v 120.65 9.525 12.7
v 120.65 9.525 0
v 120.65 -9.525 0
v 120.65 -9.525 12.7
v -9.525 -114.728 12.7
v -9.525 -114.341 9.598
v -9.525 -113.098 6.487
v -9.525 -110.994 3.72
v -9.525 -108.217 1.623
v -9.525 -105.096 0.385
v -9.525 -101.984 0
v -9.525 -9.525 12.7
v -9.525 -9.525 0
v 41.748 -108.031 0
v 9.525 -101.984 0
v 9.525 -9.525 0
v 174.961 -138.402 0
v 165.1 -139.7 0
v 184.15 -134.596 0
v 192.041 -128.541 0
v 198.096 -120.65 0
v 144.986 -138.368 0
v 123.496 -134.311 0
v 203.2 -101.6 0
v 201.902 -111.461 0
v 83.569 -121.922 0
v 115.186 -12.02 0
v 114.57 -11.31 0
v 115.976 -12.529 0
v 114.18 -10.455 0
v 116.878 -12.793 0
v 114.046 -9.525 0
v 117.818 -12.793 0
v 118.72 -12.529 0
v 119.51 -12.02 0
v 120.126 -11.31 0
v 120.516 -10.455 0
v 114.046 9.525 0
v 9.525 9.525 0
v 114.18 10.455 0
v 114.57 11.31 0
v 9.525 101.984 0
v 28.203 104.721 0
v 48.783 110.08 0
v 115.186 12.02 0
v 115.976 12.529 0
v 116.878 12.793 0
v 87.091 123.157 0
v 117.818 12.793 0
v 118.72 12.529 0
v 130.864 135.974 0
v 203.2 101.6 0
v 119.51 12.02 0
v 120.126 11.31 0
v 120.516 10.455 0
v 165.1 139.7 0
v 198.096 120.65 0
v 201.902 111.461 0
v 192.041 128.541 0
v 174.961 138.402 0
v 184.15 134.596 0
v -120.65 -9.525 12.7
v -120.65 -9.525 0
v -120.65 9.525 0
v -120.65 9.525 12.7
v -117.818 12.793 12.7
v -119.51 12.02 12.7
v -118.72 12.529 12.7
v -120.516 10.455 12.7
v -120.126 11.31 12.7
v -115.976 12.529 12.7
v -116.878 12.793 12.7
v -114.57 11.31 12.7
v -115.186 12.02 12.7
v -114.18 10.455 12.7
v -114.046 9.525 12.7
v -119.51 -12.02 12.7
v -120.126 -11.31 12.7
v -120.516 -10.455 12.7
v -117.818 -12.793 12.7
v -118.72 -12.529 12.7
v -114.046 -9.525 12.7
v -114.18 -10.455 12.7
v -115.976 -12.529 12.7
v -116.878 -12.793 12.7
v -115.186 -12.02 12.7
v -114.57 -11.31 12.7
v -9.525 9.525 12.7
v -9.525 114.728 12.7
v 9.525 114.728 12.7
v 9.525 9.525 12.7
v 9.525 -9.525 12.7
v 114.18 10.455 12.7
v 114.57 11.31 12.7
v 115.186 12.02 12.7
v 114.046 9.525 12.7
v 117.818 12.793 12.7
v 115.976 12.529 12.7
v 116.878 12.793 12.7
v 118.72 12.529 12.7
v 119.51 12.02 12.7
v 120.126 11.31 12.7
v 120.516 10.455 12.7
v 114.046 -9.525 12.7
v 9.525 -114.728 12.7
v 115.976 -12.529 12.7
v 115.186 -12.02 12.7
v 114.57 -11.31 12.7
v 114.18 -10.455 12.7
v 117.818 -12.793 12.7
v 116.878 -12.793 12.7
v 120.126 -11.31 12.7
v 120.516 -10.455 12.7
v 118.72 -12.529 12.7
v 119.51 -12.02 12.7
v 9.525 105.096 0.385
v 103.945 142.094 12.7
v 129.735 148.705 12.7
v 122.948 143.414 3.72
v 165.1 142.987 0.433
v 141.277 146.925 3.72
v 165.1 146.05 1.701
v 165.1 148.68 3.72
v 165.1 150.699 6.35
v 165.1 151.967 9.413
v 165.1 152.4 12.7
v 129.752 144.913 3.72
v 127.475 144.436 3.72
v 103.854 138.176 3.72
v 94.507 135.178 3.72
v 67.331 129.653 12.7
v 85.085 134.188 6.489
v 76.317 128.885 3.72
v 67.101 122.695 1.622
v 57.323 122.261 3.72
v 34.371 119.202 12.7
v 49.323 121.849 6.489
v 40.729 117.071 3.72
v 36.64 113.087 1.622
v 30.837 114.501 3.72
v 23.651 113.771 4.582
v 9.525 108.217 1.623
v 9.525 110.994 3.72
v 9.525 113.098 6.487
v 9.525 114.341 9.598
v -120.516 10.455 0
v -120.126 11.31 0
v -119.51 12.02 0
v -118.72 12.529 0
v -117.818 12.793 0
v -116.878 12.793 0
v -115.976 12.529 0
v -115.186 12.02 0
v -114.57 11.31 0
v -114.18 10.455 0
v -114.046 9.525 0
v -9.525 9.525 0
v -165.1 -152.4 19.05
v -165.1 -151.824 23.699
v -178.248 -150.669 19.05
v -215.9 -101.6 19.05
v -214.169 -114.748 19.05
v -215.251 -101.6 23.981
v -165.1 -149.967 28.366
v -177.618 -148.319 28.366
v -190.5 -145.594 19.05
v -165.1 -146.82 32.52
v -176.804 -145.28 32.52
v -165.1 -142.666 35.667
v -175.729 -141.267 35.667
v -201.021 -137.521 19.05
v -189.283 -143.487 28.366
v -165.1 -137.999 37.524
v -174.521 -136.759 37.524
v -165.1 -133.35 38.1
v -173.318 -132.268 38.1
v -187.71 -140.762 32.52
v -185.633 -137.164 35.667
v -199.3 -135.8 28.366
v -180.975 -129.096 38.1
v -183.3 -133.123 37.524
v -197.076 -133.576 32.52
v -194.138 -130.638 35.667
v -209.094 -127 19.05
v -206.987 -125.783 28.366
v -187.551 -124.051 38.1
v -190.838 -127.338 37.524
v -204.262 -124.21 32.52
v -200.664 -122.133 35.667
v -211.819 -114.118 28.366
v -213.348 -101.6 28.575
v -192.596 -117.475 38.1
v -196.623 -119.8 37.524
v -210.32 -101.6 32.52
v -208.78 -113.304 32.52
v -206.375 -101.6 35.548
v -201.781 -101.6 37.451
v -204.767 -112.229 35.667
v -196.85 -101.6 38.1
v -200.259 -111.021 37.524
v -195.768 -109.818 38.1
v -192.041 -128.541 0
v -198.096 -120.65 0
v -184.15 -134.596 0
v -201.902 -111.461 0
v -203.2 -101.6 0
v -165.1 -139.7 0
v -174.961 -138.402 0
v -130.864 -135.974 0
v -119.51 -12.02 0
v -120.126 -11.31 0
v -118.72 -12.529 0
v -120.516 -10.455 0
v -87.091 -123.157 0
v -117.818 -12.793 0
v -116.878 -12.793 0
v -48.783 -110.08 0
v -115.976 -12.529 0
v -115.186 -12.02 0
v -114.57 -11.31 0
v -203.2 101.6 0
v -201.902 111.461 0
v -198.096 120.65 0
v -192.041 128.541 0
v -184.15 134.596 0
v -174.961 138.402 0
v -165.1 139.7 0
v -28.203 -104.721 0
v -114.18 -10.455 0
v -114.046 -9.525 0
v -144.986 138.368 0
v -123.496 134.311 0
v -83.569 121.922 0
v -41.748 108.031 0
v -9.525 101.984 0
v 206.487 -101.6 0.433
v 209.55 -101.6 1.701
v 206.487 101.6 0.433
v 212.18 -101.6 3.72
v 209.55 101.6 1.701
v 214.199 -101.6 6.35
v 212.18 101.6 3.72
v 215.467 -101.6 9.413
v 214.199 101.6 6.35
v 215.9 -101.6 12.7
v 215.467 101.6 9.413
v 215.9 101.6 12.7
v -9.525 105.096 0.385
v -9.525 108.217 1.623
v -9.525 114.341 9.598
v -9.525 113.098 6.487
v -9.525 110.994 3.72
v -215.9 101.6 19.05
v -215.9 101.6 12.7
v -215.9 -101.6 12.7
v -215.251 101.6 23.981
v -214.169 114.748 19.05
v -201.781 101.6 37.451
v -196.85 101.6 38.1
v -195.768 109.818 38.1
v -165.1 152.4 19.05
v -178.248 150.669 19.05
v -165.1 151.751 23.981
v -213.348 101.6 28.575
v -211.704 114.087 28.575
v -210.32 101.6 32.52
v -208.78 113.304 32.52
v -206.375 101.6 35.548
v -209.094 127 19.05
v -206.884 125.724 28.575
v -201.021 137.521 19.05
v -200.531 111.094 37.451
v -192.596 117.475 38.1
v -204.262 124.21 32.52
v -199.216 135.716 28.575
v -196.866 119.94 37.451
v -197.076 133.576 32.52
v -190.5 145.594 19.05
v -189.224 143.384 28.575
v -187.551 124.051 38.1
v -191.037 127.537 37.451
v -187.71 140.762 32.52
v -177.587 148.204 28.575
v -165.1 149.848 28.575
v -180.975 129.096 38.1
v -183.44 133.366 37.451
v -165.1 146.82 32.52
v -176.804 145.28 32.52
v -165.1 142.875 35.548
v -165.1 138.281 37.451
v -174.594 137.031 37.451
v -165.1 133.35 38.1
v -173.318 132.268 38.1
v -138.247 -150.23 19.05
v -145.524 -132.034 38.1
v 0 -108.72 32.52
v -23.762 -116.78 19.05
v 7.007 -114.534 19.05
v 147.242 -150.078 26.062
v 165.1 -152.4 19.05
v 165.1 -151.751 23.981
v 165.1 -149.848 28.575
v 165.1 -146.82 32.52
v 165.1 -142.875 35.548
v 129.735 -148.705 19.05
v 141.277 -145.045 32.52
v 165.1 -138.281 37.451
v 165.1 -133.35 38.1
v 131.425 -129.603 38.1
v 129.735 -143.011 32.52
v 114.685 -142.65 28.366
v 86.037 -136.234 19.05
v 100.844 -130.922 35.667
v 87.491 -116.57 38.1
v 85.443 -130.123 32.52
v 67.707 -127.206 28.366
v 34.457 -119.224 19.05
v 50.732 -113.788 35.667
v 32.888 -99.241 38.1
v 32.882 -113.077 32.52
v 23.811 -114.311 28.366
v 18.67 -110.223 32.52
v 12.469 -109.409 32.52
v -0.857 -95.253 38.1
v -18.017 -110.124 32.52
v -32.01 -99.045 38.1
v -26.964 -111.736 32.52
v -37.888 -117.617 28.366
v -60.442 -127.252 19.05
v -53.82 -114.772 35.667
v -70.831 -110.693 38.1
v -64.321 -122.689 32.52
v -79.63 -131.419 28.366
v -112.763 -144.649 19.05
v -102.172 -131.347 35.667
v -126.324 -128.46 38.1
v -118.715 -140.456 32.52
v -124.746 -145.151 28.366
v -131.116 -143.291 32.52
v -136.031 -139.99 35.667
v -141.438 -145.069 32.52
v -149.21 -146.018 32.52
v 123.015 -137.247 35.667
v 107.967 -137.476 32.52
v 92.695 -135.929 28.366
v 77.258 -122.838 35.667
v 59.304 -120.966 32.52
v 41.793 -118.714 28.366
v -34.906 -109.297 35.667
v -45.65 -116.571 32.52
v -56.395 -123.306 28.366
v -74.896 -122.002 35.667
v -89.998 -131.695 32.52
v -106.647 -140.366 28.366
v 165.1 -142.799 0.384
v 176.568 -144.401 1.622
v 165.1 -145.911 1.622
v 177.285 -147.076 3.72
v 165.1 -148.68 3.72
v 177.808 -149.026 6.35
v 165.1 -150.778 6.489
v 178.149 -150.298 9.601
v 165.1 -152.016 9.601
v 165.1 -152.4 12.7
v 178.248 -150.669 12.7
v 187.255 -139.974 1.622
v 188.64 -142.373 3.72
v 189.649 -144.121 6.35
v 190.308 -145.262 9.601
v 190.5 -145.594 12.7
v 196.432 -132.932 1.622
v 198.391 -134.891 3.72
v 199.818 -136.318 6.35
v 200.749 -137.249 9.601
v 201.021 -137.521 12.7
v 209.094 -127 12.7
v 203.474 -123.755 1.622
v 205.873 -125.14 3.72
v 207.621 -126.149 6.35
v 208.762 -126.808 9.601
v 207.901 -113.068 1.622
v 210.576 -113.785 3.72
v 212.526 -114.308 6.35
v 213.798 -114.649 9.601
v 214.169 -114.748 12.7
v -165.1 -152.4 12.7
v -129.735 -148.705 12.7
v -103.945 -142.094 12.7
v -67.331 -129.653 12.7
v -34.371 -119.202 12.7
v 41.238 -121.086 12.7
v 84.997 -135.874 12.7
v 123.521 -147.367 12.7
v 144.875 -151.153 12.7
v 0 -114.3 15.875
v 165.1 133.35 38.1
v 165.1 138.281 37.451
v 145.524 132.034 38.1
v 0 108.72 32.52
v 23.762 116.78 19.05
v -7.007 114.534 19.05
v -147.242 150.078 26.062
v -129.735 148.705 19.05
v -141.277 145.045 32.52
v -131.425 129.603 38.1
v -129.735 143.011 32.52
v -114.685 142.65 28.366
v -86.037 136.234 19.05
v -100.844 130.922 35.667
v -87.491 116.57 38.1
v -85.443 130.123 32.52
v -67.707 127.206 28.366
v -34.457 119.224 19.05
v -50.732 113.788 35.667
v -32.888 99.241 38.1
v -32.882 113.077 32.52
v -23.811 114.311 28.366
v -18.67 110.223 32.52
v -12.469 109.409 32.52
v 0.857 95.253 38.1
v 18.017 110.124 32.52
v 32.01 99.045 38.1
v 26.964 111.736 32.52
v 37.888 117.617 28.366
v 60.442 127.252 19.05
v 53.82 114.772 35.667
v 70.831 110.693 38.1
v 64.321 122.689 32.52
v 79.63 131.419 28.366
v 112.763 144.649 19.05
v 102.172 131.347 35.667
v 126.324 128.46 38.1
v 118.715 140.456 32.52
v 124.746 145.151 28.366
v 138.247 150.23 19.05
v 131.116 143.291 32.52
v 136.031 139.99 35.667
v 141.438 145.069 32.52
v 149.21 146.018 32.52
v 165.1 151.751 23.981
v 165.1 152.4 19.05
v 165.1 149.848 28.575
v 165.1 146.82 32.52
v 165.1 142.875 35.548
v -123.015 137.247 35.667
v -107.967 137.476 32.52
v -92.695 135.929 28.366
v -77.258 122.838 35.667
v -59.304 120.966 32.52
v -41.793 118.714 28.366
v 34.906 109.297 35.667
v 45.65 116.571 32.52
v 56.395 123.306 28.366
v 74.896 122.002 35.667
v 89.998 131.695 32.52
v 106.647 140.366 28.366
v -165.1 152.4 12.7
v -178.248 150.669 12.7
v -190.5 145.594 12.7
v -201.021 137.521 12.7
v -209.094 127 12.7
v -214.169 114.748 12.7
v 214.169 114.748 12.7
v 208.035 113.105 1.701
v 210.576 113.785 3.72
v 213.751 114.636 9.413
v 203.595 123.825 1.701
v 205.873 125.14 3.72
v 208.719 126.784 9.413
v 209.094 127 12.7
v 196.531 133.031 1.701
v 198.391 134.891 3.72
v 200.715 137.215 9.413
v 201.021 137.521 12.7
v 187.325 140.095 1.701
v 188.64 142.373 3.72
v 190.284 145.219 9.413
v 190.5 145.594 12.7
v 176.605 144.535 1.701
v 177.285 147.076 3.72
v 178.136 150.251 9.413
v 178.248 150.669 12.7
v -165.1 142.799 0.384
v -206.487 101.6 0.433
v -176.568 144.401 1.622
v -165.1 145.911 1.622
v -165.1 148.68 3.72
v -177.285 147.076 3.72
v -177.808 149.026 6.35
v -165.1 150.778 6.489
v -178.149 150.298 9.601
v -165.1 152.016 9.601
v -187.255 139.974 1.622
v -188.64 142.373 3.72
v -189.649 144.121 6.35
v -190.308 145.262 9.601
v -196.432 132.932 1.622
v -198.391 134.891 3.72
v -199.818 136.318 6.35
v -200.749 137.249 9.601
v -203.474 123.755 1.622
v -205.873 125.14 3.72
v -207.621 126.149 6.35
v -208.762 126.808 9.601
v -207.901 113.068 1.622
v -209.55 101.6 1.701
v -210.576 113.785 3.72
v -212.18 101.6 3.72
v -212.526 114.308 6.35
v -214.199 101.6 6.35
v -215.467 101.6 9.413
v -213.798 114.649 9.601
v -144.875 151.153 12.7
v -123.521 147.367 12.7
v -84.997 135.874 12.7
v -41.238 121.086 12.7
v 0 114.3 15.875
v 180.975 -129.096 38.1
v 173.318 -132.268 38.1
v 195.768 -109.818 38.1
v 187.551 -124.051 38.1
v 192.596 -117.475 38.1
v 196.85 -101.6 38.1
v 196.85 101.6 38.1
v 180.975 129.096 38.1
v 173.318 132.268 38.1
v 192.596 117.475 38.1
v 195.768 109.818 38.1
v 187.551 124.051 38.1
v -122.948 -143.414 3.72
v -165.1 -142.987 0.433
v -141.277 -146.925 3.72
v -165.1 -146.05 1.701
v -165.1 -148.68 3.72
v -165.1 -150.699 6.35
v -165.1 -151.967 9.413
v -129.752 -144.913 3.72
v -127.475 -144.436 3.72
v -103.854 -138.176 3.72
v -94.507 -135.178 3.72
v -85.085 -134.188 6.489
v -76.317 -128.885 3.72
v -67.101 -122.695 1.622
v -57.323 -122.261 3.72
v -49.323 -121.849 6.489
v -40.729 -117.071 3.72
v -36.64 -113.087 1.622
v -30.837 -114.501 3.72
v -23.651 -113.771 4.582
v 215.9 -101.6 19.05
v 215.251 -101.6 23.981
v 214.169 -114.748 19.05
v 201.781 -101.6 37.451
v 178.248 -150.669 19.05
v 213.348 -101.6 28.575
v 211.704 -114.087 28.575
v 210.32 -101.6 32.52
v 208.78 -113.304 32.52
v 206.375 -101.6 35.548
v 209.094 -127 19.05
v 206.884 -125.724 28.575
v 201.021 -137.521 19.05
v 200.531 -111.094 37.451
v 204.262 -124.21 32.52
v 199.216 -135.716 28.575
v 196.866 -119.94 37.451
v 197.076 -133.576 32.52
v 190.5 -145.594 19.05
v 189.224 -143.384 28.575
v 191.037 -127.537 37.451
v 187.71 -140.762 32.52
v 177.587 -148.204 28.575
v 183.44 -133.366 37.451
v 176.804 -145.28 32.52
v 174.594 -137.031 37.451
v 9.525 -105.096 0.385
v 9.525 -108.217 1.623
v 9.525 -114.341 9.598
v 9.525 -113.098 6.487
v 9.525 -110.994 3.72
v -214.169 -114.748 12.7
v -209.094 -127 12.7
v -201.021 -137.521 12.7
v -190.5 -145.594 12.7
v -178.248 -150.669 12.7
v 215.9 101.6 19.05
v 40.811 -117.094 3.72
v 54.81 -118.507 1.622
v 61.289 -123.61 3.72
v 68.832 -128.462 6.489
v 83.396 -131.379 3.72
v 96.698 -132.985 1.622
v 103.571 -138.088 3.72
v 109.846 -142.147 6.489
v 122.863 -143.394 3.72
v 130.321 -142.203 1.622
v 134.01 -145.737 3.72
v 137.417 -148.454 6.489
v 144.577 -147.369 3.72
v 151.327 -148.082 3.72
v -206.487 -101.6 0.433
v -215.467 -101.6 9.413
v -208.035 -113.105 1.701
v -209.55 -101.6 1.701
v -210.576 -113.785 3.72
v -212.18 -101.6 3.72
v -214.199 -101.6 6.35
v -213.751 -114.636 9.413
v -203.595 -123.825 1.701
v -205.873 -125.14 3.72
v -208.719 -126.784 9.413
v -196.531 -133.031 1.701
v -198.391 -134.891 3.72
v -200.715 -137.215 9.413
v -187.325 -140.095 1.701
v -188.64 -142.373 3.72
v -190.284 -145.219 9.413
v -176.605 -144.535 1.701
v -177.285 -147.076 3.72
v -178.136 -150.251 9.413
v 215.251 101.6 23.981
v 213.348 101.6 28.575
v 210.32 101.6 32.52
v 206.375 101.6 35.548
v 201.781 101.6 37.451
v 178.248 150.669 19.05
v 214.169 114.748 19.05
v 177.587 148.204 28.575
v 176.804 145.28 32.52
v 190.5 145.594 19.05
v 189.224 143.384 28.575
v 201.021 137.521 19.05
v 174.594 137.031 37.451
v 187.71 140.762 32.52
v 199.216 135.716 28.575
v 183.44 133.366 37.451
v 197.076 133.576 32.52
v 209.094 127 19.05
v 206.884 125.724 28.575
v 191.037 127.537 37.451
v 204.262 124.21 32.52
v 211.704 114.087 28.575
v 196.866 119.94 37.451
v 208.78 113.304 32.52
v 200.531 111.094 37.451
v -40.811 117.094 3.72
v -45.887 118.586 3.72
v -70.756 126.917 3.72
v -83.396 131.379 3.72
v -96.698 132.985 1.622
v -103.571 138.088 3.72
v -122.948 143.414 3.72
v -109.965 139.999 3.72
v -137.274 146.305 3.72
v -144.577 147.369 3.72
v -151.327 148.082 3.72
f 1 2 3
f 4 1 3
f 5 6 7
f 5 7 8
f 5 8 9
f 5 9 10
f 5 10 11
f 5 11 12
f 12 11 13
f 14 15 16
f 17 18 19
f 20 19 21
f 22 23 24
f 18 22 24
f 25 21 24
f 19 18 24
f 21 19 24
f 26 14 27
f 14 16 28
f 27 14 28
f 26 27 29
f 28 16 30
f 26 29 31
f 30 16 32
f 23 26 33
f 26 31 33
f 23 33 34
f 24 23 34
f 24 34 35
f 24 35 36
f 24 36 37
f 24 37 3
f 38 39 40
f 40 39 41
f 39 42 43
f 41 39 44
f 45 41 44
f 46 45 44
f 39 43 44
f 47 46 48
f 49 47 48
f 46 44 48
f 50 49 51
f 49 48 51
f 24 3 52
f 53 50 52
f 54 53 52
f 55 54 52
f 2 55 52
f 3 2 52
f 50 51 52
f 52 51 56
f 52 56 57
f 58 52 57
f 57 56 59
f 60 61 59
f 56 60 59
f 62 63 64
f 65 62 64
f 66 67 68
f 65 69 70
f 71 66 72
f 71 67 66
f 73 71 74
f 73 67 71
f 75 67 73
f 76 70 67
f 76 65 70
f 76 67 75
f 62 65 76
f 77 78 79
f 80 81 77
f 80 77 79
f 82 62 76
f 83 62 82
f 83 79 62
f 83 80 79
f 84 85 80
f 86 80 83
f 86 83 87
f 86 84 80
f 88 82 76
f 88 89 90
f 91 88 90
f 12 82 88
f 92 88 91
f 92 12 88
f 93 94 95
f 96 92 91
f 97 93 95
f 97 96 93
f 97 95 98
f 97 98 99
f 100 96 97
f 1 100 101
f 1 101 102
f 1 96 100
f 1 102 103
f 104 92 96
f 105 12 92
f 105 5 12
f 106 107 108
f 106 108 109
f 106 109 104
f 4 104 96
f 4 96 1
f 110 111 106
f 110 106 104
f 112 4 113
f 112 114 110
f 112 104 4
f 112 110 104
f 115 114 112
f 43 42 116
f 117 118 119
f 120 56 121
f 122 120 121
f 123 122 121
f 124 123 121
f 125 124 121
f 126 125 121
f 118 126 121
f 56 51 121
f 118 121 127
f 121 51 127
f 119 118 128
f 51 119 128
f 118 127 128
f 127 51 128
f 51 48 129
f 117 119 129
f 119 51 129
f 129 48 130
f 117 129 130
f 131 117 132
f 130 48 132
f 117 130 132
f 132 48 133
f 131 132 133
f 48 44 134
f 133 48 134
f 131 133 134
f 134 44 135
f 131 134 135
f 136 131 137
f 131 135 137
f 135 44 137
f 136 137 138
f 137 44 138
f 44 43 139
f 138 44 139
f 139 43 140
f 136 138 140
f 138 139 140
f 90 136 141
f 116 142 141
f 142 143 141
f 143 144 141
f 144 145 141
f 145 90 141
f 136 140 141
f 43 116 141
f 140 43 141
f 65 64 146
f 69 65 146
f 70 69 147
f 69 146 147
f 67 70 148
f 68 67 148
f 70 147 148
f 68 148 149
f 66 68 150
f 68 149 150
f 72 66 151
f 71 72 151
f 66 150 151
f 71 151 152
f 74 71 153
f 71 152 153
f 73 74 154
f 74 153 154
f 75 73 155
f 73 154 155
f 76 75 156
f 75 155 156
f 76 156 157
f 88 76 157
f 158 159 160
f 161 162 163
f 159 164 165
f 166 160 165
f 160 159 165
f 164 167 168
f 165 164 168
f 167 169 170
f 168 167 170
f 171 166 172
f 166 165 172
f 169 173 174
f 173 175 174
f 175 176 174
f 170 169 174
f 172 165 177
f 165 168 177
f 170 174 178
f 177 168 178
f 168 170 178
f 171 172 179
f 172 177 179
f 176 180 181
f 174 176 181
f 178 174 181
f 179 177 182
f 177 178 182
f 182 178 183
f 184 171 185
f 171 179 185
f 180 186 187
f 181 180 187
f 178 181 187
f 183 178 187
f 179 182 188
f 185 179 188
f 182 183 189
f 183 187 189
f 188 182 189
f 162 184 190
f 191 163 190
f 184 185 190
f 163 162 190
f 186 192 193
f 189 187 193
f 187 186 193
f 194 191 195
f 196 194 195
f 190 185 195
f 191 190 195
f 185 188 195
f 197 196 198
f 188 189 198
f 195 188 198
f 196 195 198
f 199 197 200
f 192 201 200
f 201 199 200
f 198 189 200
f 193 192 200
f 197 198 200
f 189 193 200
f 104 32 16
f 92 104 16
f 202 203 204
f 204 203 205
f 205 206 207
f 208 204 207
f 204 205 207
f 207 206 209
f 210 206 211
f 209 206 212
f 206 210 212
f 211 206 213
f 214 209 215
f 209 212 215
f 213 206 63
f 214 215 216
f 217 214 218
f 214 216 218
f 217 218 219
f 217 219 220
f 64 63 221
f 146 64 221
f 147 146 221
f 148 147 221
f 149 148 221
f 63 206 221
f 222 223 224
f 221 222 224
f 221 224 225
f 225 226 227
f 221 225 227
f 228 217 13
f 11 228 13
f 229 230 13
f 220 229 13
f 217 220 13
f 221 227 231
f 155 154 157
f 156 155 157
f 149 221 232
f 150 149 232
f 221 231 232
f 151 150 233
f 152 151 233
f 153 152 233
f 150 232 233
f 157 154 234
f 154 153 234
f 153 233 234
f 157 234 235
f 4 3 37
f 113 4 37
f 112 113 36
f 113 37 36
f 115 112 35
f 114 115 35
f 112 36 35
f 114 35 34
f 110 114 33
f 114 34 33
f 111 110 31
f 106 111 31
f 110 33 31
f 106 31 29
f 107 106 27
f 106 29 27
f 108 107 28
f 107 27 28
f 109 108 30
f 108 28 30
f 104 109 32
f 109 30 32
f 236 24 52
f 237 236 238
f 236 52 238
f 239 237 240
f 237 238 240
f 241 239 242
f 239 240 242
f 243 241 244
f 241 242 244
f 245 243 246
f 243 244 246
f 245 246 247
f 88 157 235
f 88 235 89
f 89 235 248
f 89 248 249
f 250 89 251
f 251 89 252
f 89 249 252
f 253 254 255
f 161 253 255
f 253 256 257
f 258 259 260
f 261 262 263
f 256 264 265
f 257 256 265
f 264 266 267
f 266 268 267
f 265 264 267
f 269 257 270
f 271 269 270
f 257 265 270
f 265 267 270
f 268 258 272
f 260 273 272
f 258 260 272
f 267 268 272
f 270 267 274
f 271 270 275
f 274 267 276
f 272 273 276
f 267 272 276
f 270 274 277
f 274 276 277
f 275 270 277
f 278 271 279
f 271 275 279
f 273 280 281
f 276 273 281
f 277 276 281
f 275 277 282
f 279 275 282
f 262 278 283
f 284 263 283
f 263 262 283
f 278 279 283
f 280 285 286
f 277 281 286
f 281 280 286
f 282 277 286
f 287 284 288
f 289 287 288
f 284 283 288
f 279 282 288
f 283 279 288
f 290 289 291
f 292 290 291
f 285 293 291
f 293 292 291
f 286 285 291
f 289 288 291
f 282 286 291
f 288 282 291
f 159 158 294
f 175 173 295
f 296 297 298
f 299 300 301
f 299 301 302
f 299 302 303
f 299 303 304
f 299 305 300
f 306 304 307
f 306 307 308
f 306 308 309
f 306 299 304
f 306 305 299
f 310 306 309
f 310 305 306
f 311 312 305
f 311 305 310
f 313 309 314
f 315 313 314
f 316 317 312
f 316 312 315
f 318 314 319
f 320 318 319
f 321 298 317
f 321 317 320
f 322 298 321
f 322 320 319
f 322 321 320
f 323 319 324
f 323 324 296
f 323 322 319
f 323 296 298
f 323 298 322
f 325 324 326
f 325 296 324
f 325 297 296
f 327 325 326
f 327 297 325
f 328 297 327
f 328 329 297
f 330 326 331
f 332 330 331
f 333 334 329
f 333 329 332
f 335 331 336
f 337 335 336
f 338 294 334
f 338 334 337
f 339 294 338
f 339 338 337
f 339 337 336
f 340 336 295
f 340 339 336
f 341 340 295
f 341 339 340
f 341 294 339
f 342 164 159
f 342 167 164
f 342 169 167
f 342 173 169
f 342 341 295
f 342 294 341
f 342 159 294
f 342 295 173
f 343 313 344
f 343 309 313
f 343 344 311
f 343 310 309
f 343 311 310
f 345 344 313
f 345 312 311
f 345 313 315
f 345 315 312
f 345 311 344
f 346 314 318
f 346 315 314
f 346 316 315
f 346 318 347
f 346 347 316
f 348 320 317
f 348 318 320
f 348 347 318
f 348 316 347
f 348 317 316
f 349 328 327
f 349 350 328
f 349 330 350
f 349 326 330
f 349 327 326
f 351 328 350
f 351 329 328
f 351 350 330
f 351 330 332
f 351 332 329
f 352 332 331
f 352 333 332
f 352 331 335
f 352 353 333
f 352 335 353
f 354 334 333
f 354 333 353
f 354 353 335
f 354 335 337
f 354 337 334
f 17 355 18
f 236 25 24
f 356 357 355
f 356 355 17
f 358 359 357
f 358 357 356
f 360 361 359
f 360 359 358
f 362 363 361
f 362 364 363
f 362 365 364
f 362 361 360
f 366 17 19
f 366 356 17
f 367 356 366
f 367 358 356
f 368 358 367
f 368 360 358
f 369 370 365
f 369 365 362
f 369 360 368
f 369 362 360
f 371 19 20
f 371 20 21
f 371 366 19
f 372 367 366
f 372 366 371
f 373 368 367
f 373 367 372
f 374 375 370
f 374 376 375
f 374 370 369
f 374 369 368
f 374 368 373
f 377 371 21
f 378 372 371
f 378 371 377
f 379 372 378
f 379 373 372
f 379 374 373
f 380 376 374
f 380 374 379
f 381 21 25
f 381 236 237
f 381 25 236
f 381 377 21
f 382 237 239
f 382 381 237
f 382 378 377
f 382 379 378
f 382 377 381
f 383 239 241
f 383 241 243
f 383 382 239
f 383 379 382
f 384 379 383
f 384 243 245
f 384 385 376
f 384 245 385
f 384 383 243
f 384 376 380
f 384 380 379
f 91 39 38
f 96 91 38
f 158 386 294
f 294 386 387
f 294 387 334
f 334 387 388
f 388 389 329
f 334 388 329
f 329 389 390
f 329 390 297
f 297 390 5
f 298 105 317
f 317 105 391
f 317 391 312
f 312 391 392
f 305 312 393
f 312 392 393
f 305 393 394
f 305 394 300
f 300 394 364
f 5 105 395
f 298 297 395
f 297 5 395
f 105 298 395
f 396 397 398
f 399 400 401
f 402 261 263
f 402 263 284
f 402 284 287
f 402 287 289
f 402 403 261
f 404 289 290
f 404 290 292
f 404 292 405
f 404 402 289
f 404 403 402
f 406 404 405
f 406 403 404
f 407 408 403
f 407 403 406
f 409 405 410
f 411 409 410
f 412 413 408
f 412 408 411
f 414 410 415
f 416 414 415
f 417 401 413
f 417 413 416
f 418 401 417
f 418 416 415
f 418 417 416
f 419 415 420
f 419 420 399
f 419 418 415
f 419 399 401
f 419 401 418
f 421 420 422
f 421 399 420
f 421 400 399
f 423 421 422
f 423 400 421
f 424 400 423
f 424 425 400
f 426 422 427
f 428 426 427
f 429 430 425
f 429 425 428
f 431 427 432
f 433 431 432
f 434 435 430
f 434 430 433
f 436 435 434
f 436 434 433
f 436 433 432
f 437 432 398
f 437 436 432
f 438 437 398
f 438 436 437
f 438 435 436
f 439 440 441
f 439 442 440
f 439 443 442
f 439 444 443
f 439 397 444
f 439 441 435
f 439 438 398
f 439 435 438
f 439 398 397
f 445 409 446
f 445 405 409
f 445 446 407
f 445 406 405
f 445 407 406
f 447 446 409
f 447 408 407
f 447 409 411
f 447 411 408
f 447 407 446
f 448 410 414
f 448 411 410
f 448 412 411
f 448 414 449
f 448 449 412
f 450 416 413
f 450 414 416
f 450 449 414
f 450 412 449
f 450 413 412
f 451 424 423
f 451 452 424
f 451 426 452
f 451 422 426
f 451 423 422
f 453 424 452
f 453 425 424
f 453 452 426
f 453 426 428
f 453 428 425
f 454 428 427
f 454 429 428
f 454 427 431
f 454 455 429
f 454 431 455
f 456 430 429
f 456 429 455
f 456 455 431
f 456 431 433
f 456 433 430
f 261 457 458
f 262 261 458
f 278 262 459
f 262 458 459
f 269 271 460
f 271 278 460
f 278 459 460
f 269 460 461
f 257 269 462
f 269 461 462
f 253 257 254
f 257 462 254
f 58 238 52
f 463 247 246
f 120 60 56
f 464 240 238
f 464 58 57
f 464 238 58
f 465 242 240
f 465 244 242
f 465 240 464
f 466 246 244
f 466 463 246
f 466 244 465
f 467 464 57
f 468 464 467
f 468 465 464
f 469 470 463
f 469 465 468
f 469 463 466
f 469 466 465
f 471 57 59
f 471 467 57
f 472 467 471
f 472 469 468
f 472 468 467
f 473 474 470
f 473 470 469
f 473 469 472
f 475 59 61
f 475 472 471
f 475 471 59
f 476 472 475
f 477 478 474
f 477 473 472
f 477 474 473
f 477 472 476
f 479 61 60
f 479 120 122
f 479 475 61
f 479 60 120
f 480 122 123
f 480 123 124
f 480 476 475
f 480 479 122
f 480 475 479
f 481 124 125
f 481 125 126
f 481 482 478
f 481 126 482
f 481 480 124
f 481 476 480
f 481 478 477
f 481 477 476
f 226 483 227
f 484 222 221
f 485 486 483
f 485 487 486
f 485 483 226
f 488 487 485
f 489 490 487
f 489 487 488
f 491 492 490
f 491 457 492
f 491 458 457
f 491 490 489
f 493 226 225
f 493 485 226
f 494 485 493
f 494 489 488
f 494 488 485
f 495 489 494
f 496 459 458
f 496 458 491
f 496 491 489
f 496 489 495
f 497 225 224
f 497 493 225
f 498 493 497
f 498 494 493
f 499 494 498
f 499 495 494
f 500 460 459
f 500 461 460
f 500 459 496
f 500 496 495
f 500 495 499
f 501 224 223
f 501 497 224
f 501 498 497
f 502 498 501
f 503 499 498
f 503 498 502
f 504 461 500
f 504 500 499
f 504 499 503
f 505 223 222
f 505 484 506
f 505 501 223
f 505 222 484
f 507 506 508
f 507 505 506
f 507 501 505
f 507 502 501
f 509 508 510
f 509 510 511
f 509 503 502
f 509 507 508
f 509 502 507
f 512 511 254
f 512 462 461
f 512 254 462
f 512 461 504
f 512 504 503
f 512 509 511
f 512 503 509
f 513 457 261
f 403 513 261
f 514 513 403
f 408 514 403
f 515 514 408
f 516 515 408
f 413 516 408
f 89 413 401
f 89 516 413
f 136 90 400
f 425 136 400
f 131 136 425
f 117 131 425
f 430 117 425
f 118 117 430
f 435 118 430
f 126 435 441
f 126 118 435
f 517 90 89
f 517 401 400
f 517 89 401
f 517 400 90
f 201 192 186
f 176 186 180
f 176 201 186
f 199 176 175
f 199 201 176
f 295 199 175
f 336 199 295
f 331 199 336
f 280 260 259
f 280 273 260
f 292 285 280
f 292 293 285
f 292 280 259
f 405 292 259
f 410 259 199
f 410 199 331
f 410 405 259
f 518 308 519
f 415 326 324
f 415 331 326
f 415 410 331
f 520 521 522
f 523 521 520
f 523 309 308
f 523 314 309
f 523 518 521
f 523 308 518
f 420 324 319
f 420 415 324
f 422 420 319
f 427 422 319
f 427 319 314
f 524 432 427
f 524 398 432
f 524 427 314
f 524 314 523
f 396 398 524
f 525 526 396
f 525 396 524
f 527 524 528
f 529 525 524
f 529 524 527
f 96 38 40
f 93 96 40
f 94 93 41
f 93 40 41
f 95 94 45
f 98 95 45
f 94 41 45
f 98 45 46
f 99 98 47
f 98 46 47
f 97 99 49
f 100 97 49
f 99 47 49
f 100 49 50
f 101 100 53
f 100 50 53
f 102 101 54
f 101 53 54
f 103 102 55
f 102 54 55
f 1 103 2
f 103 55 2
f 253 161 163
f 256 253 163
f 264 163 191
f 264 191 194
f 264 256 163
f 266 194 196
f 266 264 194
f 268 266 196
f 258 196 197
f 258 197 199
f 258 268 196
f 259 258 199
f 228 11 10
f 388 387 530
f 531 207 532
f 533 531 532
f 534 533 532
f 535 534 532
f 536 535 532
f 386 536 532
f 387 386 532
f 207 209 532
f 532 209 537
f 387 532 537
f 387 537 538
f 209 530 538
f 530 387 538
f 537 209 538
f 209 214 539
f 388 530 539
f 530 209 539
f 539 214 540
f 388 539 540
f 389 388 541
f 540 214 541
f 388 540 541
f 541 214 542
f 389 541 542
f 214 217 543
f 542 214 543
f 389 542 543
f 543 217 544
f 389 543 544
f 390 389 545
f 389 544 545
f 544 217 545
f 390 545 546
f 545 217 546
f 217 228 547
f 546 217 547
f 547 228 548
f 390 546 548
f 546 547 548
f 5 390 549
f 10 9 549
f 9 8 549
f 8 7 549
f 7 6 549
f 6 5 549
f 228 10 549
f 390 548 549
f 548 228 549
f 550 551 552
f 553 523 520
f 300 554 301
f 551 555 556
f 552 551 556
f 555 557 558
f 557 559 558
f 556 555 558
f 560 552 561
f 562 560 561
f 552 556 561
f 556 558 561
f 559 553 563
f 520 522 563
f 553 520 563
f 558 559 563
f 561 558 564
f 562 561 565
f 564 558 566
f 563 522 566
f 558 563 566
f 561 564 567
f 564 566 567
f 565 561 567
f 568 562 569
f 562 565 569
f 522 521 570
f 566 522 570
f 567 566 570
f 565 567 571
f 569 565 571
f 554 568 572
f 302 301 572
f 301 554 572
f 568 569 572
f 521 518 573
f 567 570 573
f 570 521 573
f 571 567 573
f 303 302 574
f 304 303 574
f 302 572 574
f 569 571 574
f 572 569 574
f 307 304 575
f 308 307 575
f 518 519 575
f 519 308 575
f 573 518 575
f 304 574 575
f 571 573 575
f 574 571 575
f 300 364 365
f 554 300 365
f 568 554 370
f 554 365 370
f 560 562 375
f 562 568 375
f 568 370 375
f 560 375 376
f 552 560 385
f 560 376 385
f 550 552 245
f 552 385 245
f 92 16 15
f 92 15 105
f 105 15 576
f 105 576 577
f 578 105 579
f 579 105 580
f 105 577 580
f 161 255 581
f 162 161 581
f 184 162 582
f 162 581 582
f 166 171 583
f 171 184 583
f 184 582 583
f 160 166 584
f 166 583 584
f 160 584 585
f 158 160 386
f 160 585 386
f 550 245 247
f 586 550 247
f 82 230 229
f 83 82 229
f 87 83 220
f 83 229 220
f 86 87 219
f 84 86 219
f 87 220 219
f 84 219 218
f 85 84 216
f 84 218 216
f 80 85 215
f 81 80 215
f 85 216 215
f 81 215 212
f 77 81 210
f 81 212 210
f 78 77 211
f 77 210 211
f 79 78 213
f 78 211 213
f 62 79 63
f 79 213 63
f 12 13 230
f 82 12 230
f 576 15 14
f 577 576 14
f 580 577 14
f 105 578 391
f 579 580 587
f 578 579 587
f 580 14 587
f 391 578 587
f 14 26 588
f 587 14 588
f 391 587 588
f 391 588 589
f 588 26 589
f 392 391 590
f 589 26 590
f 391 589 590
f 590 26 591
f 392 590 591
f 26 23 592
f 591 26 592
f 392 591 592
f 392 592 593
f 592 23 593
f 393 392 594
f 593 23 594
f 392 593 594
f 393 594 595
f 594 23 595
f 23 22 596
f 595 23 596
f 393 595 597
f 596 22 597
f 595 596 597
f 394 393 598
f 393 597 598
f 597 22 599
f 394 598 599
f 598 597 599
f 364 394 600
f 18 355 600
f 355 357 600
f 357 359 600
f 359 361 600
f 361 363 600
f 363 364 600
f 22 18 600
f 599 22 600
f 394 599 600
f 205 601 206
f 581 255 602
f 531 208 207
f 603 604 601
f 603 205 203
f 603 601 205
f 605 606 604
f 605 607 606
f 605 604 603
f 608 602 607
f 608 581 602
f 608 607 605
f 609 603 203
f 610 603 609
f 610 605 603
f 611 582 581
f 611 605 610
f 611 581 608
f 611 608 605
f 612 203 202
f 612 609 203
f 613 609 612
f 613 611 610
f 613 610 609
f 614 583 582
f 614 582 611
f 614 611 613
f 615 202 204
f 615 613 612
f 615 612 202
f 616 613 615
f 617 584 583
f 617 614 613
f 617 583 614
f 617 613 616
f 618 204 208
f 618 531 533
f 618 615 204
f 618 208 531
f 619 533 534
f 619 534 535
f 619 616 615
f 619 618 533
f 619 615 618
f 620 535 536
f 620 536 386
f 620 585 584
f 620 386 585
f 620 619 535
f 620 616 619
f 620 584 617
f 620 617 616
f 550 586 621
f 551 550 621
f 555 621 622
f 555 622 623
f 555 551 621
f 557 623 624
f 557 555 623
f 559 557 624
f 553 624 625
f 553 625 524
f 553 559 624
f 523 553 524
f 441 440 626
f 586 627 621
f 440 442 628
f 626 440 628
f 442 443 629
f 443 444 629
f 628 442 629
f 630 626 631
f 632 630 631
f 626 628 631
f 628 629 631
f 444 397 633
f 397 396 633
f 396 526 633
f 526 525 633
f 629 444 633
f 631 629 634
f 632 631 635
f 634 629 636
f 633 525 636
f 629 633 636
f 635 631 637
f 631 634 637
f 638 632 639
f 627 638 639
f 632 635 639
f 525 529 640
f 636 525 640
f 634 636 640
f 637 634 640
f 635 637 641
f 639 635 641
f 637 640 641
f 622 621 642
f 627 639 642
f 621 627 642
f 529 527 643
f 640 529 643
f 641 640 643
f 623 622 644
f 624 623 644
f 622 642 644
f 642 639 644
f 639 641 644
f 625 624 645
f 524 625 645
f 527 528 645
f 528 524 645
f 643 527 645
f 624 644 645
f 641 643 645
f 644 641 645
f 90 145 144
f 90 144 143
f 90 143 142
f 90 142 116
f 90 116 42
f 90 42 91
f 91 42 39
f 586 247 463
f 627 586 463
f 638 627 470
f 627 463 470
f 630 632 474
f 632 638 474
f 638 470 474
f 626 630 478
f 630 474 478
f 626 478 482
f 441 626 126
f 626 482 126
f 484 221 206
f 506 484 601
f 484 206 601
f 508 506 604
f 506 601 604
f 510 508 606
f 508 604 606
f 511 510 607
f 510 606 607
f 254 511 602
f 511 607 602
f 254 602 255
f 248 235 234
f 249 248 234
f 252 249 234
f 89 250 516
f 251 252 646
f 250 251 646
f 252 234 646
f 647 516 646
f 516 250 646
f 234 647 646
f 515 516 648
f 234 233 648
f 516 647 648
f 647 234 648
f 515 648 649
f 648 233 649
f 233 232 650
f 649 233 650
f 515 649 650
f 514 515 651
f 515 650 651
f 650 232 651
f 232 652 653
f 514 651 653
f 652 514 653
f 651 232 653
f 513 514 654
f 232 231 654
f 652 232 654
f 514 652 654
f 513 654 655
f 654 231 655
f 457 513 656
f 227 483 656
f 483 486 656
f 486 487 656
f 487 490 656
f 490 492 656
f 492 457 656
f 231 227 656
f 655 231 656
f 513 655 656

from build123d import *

# Parameters (mm, degrees)
F1_DEPTH = 38.1
F3_DEPTH = 12.7
F4_R     = 12.7
F5_R     = 19.05


with BuildPart() as f1:
    # F0 (on Top) → F1 (new body)
    with BuildSketch(Plane.XY):
        with BuildLine():
            ThreePointArc((-165.1, 152.4), (-201.021024, 137.521024), (-215.9, 101.6))
            Line((-215.9, 101.6), (-215.9, -101.6))
            ThreePointArc((-215.9, -101.6), (-201.021024, -137.521024), (-165.1, -152.4))
            add(Edge.make_bspline(
                [(-165.1, -152.4), (-101.6, -152.4), (0, -76.2), (101.6, -152.4), (165.1, -152.4)],
                knots=[0, 0, 0, 0, 169.439134, 338.878267, 338.878267, 338.878267, 338.878267], degree=3))
            ThreePointArc((165.1, -152.4), (201.021024, -137.521024), (215.9, -101.6))
            Line((215.9, -101.6), (215.9, 101.6))
            ThreePointArc((215.9, 101.6), (201.021024, 137.521024), (165.1, 152.4))
            add(Edge.make_bspline(
                [(-165.1, 152.4), (-101.6, 152.4), (0, 76.2), (101.6, 152.4), (165.1, 152.4)],
                knots=[0, 0, 0, 0, 169.439134, 338.878267, 338.878267, 338.878267, 338.878267], degree=3))
        make_face()
    extrude(amount=F1_DEPTH)

    # F2 (on face) → F3 (cut)
    with BuildSketch(Plane(origin=(0, 0, 0), x_dir=(1, 0, 0), z_dir=(0, 0, -1))):
        with BuildLine():
            ThreePointArc((-114.046, 9.525), (-117.348, 12.827), (-120.65, 9.525))
            Line((-120.65, 9.525), (-120.65, -9.525))
            ThreePointArc((-120.65, -9.525), (-117.348, -12.827), (-114.046, -9.525))
            Line((-114.046, -9.525), (-9.525, -9.525))
            Line((-9.525, -9.525), (-9.525, -114.727609))
            add(Edge.make_bspline(
                [(-9.525, -114.727609), (-6.347935, -114.448731), (0, -114.151269), (6.347935, -114.448731), (9.525, -114.727609)],
                knots=[158.852632, 158.852632, 158.852632, 158.852632, 169.439134, 180.025636, 180.025636, 180.025636, 180.025636], degree=3))
            Line((9.525, -114.727609), (9.525, -9.525))
            Line((9.525, -9.525), (114.046, -9.525))
            ThreePointArc((114.046, -9.525), (117.348, -12.827), (120.65, -9.525))
            Line((120.65, -9.525), (120.65, 9.525))
            ThreePointArc((120.65, 9.525), (117.348, 12.827), (114.046, 9.525))
            Line((114.046, 9.525), (9.525, 9.525))
            Line((9.525, 9.525), (9.525, 114.727609))
            add(Edge.make_bspline(
                [(-9.525, 114.727609), (-6.347935, 114.448731), (0, 114.151269), (6.347935, 114.448731), (9.525, 114.727609)],
                knots=[158.852632, 158.852632, 158.852632, 158.852632, 169.439134, 180.025636, 180.025636, 180.025636, 180.025636], degree=3))
            Line((-9.525, 114.727609), (-9.525, 9.525))
            Line((-9.525, 9.525), (-114.046, 9.525))
        make_face()
    extrude(amount=-F3_DEPTH, mode=Mode.SUBTRACT)

    # F4
    f4_edges = [f1.edges().sort_by_distance(p)[0] for p in [
        (-201.021024, -137.521024, 0),
        (-86.699653, -136.462181, 0),
        (86.699653, -136.462181, 0),
    ]]
    fillet(f4_edges, radius=F4_R)

    # F5
    f5_edges = [f1.edges().sort_by_distance(p)[0] for p in [
        (0, 114.3, 38.1),
    ]]
    fillet(f5_edges, radius=F5_R)


solid = f1.part
